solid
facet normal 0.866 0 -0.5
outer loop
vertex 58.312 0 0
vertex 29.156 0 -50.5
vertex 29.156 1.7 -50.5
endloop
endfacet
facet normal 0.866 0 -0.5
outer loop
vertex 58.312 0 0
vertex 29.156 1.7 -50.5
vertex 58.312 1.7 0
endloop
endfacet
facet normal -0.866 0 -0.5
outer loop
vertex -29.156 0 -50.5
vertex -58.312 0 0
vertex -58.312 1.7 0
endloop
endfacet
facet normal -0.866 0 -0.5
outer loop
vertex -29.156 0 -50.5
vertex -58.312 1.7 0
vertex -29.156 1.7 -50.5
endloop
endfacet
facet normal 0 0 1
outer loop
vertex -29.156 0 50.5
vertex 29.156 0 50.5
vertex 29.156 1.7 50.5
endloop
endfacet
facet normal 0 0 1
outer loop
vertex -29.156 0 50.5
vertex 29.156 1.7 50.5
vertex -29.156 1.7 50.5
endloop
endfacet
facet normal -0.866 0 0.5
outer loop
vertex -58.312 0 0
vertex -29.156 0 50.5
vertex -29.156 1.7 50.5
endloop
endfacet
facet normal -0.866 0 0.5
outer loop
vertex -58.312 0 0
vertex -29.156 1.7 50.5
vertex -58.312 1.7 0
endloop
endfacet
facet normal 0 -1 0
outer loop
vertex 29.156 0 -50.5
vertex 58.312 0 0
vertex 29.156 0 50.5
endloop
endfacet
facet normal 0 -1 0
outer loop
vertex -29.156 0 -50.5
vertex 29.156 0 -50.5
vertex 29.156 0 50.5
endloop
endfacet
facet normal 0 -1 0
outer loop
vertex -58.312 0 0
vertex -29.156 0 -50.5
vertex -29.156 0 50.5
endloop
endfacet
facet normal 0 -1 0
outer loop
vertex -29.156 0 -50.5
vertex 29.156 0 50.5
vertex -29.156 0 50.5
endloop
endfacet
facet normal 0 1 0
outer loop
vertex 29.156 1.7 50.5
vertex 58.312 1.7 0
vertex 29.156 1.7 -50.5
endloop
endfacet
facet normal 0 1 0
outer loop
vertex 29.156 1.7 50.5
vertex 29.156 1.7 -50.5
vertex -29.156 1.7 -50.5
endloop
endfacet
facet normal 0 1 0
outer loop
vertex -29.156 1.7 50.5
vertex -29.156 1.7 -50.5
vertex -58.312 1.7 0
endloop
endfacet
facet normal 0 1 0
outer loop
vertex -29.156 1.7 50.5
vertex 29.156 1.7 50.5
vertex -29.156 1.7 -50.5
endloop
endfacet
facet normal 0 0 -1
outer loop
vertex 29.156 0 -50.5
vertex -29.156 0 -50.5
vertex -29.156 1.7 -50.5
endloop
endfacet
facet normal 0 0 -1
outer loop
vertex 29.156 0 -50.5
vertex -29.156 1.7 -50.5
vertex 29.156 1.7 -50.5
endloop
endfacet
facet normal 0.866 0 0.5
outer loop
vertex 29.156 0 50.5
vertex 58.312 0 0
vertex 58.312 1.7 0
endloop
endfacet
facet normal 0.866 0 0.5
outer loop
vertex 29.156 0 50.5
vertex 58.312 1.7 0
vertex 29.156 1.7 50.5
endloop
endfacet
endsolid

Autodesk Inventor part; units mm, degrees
ref_plane "YZ Plane" through (0, 0, 0) normal (1, 0, 0) x (0, 1, 0)
ref_plane "XZ Plane" through (0, 0, 0) normal (0, 1, 0) x (-1, 0, 0)
ref_plane "XY Plane" through (0, 0, 0) normal (0, 0, 1) x (1, 0, 0)
sketch "Sketch1" plane through (0, 0, 0) normal (0, 1, 0) x (-1, 0, 0)
  line L0 (-29.1562, -50.5) -> (-58.3124, 0)
  line L1 (-58.3124, 0) -> (-29.1562, 50.5)
  line L2 (-29.1562, 50.5) -> (29.1562, 50.5)
  line L3 (29.1562, 50.5) -> (58.3124, 0)
  line L4 (58.3124, 0) -> (29.1562, -50.5)
  line L5 (29.1562, -50.5) -> (-29.1562, -50.5)
  point P0 (0, 0)
  point P1 (0, 0)
  dimension "d0" = 101
extrude "Extrusion1" add sketch "Sketch1" along normal blind 1.7
equation "\"d0\" = FlatDiameter"
equation "\"d1\" = Thickness"
equation "\"FlatDiameter\" = 101"
equation "\"Thickness\" = 1.7"
properties part number "Hex_Single" material "Paper"
